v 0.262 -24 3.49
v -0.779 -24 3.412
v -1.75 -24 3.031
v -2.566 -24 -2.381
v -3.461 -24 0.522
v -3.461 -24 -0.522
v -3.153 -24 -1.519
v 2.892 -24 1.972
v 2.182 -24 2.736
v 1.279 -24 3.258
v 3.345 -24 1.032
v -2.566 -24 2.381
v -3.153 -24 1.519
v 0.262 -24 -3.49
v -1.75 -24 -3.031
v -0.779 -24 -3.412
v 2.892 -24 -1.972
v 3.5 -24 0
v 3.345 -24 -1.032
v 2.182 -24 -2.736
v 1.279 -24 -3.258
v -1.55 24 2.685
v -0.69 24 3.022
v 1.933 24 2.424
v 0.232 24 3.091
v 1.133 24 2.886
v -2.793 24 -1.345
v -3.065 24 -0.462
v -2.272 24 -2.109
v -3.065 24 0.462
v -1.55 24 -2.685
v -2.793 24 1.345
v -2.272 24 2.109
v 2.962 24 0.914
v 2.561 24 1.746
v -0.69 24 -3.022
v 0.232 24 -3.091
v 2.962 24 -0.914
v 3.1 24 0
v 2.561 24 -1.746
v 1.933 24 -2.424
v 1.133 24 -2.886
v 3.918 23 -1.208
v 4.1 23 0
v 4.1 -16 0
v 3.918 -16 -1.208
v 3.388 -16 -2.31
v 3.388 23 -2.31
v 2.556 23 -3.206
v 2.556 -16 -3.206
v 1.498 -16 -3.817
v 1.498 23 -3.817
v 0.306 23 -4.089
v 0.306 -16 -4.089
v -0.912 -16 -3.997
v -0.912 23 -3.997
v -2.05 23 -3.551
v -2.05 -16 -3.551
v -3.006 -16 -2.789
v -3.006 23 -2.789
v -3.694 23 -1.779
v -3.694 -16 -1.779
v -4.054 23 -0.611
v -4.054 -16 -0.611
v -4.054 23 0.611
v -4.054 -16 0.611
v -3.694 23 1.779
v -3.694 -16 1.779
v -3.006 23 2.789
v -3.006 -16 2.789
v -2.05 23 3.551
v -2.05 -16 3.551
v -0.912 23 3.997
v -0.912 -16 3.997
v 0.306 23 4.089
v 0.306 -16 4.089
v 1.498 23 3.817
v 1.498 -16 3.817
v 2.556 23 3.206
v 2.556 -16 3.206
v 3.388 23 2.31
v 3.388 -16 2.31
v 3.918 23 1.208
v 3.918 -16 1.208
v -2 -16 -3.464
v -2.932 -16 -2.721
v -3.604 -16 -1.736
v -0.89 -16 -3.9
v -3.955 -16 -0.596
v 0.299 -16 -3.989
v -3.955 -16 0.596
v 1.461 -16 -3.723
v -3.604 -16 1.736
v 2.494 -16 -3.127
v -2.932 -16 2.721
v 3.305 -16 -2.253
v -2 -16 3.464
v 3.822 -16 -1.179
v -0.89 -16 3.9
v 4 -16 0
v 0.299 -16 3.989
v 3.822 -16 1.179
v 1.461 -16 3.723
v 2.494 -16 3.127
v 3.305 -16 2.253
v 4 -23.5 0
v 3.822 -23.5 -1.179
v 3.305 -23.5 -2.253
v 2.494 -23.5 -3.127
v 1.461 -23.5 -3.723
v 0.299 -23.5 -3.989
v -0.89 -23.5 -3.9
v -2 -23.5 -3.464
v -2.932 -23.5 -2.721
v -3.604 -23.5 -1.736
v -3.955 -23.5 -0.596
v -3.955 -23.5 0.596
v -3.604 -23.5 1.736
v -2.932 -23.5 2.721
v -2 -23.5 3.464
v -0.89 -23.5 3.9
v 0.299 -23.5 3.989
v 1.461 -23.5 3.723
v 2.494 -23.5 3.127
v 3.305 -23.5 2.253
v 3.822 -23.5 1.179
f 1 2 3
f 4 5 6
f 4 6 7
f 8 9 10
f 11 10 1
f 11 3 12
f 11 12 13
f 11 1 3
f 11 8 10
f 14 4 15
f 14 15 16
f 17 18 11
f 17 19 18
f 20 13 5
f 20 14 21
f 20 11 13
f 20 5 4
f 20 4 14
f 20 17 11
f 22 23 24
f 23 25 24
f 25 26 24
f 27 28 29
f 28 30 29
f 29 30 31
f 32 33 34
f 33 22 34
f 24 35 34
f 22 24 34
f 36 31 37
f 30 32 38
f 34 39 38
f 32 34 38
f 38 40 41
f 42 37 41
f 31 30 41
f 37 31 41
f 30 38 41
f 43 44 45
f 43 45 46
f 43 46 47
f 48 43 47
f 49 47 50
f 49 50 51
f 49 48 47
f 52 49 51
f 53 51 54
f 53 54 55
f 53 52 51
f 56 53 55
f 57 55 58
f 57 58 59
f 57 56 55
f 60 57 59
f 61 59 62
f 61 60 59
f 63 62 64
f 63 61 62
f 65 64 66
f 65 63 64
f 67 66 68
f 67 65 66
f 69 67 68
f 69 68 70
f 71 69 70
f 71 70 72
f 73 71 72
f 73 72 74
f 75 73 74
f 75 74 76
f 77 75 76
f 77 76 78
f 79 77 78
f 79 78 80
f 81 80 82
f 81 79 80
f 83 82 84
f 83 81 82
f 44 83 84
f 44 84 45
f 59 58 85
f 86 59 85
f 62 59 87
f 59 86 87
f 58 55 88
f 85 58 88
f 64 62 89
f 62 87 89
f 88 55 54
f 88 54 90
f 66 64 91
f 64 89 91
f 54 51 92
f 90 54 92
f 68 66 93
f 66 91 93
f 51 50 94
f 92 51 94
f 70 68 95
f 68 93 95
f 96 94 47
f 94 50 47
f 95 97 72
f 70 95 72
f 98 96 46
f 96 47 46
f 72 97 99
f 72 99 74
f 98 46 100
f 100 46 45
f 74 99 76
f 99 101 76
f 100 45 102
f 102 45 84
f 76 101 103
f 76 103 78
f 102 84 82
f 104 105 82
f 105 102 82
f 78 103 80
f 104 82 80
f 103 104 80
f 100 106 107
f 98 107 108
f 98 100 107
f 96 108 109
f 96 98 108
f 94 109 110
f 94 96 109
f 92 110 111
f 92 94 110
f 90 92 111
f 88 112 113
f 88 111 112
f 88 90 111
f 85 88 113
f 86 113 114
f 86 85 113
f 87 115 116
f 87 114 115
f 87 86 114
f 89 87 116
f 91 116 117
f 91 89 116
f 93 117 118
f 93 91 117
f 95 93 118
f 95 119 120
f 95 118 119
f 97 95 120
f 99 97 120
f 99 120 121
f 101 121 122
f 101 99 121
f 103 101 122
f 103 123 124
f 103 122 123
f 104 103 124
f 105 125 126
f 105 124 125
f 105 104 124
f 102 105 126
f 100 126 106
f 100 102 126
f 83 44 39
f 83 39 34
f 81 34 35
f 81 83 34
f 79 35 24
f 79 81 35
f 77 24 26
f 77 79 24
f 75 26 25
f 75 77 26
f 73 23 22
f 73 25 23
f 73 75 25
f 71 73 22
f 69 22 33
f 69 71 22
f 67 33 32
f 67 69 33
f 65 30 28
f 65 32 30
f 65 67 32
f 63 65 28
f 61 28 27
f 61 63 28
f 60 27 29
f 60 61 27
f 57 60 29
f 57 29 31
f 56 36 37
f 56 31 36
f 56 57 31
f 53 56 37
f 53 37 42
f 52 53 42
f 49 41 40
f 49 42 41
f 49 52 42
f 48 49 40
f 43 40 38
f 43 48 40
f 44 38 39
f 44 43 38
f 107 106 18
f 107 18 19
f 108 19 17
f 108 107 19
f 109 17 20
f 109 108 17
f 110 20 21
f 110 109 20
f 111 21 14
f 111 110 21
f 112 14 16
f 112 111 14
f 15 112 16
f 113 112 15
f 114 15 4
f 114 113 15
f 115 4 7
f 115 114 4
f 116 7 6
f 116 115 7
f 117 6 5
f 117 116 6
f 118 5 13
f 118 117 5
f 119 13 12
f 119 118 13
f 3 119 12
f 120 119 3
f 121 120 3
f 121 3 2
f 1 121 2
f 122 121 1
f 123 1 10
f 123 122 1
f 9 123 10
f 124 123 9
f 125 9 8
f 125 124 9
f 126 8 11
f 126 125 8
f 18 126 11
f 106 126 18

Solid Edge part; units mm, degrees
sketch "Sketch1" plane through (0, 0, 0) normal (0, -1, 0) x (1, 0, 0)
  circle A0 centre (0, 0) radius 4
  dimension "D1" = 8
extrude "Protrusion1" add sketch "Sketch1" along normal mid plane 48
sketch "Sketch2" plane through (0, 24, 0) normal (0, 1, 0) x (1, 0, 0)
  circle A0 centre (0, 0) radius 4.1
  dimension "D1" = 8.2
extrude "Ausprägung_2" add sketch "Sketch2" against normal blind 40
cosmetic_thread "Thread1" size "M8"
chamfer "Fase_2" distance 1 angle 45 1 edges at (-4.1, 24, 0)
chamfer "Fase_3" distance 0.5 angle 45 1 edges at (-4, -24, 0)
